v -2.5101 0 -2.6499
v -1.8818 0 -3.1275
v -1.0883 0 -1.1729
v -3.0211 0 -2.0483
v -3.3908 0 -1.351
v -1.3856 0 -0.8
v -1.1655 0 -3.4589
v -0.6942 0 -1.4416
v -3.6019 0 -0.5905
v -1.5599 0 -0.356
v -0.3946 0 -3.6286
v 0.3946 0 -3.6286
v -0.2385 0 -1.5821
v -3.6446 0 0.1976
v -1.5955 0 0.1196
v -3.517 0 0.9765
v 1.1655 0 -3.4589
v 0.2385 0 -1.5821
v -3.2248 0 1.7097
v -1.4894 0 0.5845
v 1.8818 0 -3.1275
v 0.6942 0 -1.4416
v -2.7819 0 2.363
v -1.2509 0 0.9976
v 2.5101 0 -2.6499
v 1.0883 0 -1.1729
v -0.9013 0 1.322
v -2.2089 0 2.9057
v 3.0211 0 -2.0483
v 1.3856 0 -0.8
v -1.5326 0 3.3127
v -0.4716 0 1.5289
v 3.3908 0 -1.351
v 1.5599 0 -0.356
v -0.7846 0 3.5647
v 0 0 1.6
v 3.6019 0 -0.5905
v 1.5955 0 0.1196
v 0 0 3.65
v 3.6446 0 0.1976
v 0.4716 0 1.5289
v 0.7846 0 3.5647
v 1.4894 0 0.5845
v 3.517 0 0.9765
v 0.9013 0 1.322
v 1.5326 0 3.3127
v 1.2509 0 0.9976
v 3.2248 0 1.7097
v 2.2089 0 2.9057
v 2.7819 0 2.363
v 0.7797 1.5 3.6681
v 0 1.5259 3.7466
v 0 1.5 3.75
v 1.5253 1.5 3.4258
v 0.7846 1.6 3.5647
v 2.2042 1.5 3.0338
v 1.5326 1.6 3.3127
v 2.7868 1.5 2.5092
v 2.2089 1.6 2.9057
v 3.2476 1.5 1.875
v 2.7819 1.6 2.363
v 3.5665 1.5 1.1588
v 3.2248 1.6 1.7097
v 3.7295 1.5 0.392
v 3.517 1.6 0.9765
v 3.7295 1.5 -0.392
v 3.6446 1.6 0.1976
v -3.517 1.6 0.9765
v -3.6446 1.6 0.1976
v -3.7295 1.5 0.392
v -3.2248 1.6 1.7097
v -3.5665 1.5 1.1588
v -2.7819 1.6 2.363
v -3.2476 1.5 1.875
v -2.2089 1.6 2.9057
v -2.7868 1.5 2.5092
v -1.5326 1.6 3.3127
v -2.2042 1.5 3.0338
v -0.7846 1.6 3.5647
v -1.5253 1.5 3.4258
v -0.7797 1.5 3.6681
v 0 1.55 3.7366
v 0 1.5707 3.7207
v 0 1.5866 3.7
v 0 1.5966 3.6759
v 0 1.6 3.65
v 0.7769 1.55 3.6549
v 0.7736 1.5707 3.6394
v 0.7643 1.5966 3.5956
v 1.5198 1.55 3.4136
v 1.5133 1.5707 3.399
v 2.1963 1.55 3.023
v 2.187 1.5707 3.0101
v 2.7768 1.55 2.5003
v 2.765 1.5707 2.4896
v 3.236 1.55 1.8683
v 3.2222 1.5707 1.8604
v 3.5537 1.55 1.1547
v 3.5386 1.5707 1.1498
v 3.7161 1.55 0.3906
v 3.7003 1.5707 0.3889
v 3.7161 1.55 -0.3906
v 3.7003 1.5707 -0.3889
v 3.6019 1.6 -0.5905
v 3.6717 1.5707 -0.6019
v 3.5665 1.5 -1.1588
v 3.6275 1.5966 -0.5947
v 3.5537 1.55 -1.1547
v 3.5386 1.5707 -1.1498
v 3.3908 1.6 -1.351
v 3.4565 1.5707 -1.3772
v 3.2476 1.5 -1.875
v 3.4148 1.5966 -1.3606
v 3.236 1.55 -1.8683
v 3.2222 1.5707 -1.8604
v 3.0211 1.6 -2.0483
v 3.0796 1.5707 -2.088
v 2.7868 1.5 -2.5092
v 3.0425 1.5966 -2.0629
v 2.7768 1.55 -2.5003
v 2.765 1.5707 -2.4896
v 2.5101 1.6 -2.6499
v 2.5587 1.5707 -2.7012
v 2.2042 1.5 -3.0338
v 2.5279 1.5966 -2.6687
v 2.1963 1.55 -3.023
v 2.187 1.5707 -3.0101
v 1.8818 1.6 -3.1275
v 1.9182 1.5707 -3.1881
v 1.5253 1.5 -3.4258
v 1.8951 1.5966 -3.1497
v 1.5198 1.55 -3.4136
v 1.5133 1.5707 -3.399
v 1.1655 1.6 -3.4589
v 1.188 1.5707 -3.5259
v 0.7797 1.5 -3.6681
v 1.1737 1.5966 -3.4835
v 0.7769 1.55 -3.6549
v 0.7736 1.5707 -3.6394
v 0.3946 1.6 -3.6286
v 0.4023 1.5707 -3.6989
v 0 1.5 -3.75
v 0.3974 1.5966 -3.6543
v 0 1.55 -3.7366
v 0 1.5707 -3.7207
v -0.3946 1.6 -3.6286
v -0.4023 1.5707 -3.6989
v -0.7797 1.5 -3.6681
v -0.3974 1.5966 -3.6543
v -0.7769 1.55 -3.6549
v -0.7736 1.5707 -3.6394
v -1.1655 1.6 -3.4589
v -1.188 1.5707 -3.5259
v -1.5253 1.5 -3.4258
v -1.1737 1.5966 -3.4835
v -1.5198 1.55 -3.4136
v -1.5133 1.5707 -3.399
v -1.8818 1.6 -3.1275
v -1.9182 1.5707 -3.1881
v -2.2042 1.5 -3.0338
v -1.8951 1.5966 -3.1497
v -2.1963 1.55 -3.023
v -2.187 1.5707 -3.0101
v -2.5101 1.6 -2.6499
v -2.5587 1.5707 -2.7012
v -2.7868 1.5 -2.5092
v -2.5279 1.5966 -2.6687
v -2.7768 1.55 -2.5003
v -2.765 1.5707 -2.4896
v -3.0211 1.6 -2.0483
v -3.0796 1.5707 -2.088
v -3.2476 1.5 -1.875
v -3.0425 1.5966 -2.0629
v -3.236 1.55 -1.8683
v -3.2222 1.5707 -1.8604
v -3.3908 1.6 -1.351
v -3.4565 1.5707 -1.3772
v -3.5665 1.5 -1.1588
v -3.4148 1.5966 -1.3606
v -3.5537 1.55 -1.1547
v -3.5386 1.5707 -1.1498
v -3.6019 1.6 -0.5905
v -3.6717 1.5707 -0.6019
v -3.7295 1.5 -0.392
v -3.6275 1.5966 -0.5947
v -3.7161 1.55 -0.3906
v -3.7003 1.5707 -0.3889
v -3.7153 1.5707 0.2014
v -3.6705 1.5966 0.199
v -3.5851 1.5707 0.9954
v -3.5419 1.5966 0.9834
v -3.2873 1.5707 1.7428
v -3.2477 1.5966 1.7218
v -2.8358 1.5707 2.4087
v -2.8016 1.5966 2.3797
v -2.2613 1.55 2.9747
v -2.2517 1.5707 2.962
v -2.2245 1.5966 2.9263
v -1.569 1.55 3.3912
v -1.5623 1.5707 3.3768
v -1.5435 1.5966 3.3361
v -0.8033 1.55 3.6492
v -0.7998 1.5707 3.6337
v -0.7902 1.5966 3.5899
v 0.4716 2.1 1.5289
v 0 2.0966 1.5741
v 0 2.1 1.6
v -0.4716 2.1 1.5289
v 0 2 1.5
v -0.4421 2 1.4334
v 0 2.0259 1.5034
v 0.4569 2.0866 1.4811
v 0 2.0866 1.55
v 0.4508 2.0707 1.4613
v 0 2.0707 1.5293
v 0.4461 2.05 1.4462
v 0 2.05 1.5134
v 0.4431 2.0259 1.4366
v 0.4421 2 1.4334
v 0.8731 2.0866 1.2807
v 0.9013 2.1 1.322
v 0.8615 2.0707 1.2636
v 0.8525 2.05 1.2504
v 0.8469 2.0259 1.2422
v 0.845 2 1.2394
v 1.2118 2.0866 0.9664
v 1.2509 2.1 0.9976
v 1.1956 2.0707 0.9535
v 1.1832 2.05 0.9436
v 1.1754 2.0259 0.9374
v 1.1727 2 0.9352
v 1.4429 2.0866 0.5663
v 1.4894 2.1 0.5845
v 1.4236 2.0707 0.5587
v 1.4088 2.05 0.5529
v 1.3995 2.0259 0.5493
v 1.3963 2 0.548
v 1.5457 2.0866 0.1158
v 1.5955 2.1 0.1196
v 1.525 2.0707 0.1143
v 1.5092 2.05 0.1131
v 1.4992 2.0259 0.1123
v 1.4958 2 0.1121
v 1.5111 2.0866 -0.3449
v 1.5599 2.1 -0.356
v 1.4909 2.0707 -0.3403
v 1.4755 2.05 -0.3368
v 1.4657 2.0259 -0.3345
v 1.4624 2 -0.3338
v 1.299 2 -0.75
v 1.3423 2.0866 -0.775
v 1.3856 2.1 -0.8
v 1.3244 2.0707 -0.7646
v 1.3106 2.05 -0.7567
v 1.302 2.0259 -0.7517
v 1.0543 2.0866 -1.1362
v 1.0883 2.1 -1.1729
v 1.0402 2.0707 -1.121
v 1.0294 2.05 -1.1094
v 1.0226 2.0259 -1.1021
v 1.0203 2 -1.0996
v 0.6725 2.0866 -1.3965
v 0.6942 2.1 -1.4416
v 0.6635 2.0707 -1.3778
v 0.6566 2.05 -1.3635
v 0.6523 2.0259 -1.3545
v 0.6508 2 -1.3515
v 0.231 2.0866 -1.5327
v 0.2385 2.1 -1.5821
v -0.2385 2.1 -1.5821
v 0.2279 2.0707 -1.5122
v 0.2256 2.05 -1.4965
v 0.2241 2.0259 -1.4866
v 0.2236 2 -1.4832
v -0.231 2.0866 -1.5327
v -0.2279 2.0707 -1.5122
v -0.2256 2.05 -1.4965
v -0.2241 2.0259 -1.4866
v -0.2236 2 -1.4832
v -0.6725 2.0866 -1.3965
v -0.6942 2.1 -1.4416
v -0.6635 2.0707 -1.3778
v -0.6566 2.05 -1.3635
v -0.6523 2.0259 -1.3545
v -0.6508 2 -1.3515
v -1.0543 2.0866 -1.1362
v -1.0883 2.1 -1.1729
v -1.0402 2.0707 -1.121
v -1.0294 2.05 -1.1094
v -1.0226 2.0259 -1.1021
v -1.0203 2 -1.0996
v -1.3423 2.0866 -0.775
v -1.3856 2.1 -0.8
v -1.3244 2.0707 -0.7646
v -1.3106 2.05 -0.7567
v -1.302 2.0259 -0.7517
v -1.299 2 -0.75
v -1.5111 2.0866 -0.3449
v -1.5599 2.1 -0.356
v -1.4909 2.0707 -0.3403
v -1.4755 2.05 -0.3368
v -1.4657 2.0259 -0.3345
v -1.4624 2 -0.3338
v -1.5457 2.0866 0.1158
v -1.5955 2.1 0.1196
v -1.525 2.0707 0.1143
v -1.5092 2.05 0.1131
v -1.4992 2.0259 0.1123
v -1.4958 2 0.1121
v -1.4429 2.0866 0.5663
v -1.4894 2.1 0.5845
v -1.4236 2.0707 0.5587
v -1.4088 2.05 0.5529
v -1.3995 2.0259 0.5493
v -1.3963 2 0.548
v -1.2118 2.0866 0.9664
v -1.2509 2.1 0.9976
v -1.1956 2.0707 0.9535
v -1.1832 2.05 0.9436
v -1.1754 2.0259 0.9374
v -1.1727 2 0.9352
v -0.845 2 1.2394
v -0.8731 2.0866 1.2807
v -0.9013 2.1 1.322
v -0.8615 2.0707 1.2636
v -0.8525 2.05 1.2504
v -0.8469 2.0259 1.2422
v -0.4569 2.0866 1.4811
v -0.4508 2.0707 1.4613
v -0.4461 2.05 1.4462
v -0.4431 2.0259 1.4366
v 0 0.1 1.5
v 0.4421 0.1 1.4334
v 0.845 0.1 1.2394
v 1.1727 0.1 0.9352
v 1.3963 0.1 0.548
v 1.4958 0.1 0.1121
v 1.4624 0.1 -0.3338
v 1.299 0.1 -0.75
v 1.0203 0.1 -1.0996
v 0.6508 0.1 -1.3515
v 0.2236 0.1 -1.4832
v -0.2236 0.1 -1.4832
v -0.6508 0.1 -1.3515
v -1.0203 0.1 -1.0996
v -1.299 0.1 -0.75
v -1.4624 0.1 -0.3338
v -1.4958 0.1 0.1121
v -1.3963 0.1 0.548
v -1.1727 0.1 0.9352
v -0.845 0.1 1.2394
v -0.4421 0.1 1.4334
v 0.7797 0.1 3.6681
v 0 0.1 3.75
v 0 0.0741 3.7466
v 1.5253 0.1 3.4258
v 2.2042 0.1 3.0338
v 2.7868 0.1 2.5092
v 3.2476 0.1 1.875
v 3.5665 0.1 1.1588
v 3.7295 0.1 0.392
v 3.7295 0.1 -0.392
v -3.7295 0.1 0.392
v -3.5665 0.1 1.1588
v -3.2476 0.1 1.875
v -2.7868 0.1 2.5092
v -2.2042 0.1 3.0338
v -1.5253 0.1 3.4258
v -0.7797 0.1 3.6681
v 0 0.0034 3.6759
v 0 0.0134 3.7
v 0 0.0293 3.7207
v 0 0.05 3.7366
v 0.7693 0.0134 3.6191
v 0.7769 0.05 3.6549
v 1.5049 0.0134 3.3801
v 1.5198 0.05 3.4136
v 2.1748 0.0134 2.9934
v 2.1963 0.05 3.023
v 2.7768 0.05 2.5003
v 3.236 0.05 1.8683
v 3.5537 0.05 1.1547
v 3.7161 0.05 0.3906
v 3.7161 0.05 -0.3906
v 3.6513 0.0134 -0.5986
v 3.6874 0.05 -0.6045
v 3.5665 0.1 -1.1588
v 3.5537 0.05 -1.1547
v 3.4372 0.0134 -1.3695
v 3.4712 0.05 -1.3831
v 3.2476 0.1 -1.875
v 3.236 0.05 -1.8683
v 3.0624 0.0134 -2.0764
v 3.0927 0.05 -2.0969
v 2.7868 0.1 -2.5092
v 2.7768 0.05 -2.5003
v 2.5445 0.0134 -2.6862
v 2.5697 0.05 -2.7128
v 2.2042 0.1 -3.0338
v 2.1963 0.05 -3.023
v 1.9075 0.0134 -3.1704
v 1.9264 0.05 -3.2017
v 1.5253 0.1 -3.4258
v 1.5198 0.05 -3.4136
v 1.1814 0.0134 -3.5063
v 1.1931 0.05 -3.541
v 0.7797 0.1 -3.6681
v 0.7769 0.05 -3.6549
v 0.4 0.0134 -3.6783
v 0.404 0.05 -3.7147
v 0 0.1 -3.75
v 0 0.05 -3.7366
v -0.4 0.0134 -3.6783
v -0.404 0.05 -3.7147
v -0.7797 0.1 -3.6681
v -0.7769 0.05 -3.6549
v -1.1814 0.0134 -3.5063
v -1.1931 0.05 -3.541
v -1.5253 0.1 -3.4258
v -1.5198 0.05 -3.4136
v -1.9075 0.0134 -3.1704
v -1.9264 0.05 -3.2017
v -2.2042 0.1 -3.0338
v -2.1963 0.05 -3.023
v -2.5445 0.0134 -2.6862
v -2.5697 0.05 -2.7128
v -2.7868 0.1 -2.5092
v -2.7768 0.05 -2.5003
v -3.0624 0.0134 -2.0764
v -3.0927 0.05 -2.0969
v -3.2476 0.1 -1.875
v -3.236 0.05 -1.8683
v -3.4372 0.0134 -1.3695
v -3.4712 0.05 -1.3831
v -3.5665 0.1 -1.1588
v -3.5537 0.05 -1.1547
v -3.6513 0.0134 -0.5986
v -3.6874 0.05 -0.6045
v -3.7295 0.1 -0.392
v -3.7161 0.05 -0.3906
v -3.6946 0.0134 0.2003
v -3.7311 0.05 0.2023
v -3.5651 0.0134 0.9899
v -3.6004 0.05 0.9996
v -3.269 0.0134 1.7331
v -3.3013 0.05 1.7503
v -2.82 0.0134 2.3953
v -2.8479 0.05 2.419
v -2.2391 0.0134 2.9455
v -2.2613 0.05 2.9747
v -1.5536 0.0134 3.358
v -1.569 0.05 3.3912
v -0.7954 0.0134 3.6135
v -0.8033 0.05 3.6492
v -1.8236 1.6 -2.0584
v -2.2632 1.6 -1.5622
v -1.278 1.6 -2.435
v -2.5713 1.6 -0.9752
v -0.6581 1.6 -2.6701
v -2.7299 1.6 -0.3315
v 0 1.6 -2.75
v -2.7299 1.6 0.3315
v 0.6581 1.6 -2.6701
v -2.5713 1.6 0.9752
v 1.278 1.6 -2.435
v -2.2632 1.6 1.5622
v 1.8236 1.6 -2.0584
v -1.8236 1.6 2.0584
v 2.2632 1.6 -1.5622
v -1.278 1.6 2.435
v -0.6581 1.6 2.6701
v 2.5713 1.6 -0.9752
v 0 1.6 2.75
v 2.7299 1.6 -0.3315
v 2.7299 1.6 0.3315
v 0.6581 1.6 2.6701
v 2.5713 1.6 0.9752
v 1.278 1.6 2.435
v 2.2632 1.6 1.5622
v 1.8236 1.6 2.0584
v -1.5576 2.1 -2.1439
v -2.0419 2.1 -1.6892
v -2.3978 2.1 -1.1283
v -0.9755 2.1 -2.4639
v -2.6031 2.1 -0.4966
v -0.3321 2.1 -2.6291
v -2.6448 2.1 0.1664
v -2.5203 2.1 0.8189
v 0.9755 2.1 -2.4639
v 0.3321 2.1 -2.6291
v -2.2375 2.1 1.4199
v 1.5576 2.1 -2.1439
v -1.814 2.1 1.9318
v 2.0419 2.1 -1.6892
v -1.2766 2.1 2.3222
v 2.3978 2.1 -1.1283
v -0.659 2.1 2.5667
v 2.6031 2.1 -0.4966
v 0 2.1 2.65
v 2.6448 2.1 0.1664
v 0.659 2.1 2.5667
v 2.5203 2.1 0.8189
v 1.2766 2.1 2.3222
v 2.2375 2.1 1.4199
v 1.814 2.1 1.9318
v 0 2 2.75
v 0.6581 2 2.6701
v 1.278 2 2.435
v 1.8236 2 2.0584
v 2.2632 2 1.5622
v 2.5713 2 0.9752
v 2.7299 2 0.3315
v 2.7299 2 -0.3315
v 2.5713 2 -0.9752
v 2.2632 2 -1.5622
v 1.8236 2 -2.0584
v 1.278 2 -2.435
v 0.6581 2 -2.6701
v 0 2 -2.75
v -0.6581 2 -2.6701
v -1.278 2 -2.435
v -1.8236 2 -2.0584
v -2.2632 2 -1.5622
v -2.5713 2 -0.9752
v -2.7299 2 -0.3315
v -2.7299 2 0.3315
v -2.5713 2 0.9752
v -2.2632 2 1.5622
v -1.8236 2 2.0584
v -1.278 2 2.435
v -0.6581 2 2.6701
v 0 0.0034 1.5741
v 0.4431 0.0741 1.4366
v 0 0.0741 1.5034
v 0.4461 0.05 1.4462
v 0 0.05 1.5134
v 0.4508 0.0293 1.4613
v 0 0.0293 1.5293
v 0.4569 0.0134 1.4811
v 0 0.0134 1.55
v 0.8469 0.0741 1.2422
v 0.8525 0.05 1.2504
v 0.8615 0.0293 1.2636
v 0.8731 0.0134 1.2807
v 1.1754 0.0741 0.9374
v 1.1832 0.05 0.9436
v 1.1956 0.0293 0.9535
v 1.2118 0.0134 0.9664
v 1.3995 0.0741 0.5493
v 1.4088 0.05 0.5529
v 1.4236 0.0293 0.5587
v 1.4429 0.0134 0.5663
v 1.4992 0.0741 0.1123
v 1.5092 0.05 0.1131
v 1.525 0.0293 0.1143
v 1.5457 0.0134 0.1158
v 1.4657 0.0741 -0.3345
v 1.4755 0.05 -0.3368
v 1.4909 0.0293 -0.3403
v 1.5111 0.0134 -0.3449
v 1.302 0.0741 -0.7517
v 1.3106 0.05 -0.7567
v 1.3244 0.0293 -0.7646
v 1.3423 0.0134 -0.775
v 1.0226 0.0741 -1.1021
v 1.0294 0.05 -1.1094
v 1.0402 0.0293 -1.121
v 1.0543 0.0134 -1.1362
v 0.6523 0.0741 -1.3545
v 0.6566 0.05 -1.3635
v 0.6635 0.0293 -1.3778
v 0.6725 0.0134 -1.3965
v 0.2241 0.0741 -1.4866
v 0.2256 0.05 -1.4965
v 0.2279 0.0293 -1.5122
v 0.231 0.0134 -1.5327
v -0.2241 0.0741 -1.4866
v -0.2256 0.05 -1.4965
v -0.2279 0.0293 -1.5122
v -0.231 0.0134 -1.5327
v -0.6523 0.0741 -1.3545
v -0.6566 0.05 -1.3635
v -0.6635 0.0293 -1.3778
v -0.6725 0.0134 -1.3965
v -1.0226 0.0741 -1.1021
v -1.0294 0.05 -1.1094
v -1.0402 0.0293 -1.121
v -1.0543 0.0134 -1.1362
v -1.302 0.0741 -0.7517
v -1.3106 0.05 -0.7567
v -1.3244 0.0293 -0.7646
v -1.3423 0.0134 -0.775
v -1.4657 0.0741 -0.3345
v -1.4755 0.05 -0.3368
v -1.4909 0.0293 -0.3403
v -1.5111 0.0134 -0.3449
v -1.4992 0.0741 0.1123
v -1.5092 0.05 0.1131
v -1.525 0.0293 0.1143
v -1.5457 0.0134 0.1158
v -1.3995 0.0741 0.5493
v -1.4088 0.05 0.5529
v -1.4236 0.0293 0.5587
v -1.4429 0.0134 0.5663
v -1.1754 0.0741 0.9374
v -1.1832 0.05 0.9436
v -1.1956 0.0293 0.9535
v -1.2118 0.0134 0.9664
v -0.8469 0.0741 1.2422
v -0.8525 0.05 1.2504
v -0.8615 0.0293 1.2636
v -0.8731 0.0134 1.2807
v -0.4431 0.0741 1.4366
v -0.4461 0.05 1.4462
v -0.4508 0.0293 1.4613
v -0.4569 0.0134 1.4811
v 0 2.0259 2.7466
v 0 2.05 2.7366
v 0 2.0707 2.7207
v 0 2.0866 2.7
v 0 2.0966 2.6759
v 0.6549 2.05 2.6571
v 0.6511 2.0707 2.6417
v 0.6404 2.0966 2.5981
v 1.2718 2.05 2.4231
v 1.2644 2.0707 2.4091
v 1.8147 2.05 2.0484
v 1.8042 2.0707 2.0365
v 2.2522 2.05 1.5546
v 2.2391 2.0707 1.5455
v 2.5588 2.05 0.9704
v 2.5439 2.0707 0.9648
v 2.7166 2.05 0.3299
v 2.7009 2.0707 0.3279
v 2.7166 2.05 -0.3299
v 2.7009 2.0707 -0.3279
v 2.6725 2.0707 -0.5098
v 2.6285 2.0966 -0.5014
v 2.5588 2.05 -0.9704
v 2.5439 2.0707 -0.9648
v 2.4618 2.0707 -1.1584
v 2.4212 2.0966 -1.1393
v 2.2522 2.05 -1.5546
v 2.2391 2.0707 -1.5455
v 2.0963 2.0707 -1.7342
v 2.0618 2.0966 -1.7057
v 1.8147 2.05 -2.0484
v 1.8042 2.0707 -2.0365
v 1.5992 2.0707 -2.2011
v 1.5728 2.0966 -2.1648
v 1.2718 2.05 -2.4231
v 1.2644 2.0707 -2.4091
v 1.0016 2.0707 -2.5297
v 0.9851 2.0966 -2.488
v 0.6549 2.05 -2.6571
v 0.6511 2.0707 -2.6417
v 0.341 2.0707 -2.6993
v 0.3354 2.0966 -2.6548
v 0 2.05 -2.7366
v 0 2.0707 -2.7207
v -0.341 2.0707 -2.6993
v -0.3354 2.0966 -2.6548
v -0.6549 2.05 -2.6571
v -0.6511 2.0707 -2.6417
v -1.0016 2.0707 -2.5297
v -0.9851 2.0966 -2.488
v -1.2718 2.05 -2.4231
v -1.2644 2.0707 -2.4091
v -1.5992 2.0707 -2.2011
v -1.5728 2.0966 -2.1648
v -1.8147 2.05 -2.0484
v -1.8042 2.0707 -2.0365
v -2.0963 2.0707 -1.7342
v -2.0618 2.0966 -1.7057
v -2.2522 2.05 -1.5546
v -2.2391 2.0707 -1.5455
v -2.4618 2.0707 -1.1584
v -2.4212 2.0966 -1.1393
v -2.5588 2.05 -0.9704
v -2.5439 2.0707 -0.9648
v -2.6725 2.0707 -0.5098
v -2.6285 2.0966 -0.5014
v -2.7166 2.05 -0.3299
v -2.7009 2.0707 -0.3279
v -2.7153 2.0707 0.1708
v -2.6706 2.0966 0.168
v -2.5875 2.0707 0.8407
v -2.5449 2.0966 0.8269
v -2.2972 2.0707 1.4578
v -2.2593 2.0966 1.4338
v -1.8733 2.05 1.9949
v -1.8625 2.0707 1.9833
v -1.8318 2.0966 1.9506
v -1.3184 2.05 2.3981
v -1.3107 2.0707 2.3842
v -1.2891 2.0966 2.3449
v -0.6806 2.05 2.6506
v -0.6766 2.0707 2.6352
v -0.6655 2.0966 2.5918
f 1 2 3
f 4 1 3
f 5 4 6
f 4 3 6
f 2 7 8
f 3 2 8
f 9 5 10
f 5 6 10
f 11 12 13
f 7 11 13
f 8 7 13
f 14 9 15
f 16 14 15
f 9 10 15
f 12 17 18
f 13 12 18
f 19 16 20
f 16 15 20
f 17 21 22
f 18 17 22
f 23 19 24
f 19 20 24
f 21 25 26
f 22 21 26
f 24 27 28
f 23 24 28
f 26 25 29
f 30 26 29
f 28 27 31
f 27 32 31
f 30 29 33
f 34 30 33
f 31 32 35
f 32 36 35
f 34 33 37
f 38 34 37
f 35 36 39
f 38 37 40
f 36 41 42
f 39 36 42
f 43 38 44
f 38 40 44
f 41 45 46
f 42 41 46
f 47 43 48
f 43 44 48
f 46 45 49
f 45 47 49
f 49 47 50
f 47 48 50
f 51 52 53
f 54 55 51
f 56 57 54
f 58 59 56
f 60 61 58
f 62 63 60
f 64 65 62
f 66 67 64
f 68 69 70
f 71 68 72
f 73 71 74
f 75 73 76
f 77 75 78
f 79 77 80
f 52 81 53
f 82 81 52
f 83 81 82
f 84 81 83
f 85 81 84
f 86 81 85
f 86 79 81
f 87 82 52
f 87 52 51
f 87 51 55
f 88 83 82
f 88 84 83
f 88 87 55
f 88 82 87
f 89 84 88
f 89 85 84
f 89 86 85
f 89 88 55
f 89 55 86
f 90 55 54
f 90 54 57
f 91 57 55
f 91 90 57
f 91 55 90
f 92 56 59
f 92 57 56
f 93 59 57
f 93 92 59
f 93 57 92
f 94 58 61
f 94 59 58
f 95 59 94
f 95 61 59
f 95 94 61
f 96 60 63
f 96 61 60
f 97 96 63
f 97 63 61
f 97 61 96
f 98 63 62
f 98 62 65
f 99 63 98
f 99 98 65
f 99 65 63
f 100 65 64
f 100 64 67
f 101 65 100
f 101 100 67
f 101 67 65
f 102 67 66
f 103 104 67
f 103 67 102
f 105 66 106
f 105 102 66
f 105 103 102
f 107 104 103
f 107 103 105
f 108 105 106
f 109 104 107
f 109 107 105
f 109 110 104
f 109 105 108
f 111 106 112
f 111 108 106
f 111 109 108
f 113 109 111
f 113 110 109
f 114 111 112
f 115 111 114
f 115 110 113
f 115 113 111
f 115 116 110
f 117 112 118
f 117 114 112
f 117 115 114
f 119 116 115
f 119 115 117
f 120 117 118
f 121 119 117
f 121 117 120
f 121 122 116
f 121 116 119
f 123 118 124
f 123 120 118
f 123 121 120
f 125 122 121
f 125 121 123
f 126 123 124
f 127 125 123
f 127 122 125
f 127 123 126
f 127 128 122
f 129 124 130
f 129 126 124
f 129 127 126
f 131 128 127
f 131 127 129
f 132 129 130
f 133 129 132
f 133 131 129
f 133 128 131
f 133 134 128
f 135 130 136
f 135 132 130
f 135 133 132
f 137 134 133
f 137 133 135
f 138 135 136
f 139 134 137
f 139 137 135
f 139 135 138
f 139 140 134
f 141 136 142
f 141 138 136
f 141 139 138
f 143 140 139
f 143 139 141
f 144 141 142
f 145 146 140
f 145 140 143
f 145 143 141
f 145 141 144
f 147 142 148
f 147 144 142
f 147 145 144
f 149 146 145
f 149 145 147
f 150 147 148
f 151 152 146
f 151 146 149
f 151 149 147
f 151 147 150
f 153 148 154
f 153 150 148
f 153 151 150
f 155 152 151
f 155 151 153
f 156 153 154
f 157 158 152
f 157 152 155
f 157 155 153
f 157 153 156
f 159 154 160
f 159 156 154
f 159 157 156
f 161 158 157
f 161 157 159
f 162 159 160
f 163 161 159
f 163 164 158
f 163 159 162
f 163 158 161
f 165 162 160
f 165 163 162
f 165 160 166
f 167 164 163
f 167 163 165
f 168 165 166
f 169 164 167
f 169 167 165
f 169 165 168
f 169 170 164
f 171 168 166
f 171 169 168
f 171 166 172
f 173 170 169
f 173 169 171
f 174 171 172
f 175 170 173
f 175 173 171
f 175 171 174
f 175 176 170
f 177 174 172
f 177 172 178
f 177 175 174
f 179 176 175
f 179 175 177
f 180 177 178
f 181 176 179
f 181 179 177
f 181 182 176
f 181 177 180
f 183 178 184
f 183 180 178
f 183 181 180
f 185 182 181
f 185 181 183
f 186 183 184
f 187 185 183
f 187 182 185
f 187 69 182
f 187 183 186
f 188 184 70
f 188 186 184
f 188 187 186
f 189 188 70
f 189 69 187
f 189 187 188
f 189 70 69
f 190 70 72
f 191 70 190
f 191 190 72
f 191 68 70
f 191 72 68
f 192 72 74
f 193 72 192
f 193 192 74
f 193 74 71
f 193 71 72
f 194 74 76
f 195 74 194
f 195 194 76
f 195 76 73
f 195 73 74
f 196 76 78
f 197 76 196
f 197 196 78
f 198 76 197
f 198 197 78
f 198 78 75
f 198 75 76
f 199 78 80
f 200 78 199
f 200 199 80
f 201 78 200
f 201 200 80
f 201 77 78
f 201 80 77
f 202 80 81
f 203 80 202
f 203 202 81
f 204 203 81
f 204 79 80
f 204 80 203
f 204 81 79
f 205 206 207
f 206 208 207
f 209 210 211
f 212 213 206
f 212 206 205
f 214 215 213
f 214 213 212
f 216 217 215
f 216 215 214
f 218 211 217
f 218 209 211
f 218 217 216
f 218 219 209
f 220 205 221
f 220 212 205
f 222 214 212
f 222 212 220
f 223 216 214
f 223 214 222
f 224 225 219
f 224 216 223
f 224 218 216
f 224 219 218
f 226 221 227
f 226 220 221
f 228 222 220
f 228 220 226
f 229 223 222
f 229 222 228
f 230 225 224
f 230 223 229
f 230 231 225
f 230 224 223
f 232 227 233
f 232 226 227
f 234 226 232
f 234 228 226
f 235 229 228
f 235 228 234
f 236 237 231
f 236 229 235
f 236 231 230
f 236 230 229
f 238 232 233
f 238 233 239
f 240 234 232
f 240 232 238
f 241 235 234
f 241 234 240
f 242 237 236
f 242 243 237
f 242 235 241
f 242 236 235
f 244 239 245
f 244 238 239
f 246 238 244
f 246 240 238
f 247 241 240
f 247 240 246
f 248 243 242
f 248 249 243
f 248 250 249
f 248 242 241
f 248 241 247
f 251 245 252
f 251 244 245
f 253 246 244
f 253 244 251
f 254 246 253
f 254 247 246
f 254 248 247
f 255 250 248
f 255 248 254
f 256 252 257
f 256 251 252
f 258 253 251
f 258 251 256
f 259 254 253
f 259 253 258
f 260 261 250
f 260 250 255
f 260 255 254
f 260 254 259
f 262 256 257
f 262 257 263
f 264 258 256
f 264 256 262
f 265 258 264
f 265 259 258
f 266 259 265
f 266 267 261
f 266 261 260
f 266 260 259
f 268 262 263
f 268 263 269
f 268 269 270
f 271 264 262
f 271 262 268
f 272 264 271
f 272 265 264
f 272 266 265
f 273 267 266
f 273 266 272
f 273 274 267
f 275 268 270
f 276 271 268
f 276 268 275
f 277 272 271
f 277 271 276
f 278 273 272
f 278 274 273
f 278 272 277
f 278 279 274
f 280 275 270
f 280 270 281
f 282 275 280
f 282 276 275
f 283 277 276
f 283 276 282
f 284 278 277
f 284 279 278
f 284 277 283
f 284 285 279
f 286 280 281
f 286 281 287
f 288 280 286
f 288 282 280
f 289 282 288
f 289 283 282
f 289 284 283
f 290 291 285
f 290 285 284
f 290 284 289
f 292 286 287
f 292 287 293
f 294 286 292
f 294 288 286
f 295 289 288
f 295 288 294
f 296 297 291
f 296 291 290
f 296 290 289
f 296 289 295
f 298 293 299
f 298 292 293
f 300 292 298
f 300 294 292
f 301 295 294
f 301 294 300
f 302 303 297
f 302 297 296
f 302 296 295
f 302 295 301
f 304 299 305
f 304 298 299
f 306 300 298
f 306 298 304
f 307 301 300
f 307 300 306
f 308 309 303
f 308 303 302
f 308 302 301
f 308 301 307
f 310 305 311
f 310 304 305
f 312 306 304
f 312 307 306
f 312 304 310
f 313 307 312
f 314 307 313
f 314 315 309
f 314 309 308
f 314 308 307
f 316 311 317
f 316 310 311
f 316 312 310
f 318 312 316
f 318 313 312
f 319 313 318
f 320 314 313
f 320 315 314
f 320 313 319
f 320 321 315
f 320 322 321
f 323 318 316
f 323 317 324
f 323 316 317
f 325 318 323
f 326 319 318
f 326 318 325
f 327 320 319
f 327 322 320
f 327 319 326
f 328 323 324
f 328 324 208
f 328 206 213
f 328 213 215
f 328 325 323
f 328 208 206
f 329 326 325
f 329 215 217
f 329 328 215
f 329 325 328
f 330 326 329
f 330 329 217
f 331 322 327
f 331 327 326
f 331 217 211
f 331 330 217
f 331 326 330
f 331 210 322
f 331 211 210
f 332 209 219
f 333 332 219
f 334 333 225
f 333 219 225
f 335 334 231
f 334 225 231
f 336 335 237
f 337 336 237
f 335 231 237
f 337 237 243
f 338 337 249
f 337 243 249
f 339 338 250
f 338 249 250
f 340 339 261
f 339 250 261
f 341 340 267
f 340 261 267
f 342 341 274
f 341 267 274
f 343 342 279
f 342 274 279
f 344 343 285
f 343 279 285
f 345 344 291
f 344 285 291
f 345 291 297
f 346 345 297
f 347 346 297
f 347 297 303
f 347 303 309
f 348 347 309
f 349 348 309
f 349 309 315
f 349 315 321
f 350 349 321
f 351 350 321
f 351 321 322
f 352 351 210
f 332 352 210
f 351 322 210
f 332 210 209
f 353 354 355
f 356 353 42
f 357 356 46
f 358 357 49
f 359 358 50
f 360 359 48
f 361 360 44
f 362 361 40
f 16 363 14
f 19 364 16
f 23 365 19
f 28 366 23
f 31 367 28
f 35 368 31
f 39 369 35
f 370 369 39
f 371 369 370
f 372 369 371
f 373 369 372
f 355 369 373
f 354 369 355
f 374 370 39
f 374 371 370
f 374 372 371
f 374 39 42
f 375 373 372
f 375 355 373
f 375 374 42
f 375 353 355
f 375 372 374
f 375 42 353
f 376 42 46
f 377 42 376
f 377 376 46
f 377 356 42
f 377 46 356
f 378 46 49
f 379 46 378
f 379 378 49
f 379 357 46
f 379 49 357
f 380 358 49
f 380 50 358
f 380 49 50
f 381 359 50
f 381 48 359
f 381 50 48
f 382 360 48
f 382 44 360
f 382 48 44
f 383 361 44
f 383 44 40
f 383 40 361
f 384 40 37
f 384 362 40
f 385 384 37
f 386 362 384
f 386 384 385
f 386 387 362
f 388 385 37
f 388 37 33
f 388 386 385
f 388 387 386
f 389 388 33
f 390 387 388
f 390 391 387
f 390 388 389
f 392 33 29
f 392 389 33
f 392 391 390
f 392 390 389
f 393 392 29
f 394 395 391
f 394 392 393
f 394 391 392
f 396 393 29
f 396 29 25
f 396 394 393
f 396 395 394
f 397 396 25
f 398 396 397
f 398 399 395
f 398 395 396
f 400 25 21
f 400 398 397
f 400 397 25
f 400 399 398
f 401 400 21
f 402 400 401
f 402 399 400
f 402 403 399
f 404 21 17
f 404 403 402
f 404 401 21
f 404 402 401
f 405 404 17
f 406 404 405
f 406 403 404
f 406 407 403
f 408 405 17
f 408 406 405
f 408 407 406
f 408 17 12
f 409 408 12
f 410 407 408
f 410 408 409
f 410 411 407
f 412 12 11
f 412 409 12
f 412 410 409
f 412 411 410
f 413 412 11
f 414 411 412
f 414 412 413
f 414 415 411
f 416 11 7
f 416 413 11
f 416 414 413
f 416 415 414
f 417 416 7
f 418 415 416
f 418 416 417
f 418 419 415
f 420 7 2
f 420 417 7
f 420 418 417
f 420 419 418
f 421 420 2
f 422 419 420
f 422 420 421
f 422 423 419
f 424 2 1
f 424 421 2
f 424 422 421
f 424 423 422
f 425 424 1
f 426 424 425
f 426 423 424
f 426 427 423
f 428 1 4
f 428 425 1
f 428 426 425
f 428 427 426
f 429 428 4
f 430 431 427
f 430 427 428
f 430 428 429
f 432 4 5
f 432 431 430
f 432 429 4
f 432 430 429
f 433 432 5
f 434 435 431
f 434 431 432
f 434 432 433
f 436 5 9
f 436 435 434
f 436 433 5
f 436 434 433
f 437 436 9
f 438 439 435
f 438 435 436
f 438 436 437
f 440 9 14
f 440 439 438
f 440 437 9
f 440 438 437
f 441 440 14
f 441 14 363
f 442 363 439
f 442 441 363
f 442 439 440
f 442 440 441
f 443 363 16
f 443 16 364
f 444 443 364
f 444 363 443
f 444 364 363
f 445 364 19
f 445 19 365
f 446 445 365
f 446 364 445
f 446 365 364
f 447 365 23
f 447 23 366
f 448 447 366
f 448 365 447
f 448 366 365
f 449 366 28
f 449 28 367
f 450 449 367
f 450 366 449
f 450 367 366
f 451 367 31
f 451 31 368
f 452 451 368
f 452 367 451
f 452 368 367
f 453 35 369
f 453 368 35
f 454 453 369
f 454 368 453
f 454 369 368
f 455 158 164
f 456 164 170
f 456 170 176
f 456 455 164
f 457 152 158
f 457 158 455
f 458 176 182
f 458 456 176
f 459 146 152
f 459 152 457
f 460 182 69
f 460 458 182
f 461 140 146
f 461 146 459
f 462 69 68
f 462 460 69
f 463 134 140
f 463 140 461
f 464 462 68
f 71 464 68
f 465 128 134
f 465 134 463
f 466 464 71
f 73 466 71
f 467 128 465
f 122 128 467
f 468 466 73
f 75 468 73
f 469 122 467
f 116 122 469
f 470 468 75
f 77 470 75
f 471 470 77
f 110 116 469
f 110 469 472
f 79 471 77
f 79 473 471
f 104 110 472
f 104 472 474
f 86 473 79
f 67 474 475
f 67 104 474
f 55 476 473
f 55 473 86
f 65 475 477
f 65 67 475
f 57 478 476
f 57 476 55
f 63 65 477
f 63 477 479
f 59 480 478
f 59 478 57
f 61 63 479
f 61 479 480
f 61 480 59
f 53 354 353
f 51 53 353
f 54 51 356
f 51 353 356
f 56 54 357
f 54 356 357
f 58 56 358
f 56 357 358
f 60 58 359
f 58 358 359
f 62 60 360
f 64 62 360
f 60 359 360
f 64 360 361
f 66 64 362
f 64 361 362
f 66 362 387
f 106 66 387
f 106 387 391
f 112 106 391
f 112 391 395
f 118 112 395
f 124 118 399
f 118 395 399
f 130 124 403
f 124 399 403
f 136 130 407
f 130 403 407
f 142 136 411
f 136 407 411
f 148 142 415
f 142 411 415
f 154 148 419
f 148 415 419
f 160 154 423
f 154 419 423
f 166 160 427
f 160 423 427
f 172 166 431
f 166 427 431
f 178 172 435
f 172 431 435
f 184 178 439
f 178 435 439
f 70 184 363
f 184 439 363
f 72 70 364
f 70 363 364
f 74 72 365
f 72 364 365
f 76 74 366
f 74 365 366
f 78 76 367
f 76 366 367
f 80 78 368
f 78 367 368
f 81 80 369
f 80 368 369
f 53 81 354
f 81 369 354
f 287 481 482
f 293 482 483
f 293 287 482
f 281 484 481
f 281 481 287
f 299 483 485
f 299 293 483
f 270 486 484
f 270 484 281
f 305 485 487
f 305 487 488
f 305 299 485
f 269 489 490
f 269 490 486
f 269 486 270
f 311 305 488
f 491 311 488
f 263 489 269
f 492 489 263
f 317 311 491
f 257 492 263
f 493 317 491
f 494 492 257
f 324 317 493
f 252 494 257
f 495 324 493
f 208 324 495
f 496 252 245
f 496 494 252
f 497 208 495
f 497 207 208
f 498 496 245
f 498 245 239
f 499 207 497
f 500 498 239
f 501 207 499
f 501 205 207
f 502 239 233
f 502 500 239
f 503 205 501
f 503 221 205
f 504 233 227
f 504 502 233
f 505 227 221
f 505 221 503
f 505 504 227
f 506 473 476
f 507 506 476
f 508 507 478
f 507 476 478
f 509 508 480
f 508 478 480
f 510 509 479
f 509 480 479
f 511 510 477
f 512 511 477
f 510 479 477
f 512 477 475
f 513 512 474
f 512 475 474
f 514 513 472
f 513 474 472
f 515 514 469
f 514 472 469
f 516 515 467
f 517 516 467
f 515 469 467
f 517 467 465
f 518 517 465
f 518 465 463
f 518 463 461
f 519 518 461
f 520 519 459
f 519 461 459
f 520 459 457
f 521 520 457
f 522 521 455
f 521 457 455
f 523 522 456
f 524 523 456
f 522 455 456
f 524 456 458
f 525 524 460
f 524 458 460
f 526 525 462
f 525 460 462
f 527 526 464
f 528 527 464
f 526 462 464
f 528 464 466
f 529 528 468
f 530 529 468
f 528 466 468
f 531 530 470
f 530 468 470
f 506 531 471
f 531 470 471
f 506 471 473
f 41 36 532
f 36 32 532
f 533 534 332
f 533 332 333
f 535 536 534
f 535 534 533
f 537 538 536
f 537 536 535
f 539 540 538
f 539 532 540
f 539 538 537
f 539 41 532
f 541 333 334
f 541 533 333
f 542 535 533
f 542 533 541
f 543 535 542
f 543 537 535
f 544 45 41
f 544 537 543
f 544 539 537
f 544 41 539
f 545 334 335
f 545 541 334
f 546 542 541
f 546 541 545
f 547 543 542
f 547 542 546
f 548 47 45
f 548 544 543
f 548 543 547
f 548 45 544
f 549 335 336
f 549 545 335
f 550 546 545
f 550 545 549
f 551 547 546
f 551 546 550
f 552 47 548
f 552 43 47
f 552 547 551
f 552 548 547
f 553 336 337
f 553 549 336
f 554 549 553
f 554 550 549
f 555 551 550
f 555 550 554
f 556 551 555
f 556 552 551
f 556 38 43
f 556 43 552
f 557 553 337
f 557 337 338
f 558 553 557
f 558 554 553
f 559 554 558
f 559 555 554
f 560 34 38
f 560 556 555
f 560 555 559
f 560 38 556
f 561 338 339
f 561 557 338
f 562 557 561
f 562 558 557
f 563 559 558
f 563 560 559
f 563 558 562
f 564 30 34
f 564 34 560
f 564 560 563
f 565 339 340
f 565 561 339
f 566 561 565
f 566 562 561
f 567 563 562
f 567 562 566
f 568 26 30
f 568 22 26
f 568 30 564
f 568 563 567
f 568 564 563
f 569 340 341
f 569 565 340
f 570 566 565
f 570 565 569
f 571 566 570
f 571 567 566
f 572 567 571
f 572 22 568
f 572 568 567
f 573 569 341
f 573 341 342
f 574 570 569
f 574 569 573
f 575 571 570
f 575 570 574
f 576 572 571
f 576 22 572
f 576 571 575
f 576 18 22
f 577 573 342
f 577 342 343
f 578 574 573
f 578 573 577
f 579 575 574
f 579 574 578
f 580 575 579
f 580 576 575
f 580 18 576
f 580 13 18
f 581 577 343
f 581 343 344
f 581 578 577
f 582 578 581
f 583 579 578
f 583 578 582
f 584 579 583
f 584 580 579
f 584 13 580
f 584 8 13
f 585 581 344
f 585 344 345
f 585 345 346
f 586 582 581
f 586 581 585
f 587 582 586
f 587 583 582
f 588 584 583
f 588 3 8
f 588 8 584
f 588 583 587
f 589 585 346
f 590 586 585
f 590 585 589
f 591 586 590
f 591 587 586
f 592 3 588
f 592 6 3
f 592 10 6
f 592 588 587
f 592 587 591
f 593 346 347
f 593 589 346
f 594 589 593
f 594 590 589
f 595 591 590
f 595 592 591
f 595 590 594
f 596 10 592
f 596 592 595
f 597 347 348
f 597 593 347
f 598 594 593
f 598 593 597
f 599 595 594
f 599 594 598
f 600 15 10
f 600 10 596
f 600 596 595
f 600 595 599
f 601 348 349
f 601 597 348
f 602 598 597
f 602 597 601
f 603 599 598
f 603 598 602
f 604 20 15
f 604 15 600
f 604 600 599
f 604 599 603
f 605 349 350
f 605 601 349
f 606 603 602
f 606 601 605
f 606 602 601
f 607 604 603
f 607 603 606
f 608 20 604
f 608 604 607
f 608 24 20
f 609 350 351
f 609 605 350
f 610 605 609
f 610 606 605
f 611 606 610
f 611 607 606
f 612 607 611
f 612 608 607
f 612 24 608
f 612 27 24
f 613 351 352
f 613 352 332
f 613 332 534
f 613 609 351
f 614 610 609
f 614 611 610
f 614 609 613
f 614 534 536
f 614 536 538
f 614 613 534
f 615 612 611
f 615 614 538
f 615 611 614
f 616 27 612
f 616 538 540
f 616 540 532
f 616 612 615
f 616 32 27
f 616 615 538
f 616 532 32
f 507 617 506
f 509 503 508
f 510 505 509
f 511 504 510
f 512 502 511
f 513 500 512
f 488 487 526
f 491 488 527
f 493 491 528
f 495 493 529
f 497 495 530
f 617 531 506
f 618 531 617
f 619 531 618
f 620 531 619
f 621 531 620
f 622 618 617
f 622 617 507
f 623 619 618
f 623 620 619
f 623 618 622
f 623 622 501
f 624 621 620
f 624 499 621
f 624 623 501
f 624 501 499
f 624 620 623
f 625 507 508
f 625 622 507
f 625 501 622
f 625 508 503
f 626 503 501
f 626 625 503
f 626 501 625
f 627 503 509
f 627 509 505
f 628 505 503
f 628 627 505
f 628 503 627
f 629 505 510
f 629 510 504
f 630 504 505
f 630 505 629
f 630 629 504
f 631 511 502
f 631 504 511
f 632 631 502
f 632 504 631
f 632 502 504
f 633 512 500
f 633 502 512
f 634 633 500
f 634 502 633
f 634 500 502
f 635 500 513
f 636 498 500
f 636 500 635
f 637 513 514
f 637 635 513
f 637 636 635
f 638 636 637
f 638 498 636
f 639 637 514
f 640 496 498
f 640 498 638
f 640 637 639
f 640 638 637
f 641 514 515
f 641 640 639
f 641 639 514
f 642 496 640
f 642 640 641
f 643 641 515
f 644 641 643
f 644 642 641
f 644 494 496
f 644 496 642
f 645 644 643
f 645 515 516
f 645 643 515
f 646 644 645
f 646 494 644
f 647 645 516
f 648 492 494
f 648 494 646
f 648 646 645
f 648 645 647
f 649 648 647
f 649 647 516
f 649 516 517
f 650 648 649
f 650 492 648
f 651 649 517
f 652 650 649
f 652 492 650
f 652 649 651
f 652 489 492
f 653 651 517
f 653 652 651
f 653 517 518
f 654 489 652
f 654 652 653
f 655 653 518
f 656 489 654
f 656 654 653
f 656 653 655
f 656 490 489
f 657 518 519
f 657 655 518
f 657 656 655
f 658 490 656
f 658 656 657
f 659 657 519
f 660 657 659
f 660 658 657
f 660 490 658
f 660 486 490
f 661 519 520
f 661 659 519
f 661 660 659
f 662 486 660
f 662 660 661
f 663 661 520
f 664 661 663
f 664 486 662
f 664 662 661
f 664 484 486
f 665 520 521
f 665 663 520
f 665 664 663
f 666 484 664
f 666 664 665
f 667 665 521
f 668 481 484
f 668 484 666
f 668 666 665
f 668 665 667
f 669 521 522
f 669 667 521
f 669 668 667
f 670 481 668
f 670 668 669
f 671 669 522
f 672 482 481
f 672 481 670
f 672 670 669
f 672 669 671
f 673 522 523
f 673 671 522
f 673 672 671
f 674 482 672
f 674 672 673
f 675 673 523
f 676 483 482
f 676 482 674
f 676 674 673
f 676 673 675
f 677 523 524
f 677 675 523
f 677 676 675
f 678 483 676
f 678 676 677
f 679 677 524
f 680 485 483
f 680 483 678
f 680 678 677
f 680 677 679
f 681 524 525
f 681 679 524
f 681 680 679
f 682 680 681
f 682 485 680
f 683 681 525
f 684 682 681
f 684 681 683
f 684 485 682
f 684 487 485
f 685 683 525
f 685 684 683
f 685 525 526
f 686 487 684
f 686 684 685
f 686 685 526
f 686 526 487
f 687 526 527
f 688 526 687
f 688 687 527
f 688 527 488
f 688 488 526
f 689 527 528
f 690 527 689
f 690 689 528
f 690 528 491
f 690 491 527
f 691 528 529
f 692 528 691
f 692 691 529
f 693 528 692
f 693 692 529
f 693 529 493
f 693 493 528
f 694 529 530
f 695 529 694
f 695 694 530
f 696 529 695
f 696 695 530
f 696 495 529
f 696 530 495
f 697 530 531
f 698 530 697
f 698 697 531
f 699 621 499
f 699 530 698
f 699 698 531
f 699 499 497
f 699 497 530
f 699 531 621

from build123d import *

# Parameters (mm, degrees)
SKETCH_1_R          = 3.75
EXTRUDE_2_DEPTH     = 1.6
SKETCH_2_R          = 1.5
CUT_EXTRUDE_1_DEPTH = 2
SKETCH_3_R          = 2.75
EXTRUDE_3_DEPTH     = 0.5
SKETCH_4_R          = 1.5
CUT_EXTRUDE_2_DEPTH = 3
FILLET_1_R          = 0.1


with BuildPart() as part:
    # 草图1 → 凸台-拉伸2 (new body)
    with BuildSketch(Plane(origin=(0, 0, 0), x_dir=(1, 0, 0), z_dir=(0, 1, 0))):
        with Locations(Location((0, 0, 0), (0, 0, 270))):
            Circle(SKETCH_1_R)
    extrude(amount=EXTRUDE_2_DEPTH)

    # 草图2 → 切除-拉伸1 (cut)
    with BuildSketch(Plane(origin=(0, 1.6, 0), x_dir=(1, 0, 0), z_dir=(0, 1, 0))):
        with Locations(Location((0, 0, 0), (0, 0, 270))):
            Circle(SKETCH_2_R)
    extrude(amount=-CUT_EXTRUDE_1_DEPTH, mode=Mode.SUBTRACT)

    # 草图3 → 凸台-拉伸3 (add)
    with BuildSketch(Plane(origin=(0, 1.6, 0), x_dir=(1, 0, 0), z_dir=(0, 1, 0))):
        with Locations(Location((0, 0, 0), (0, 0, 270))):
            Circle(SKETCH_3_R)
    extrude(amount=EXTRUDE_3_DEPTH)

    # 草图4 → 切除-拉伸2 (cut)
    with BuildSketch(Plane(origin=(0, 2.1, 0), x_dir=(1, 0, 0), z_dir=(0, 1, 0))):
        with Locations(Location((0, 0, 0), (0, 0, 270))):
            Circle(SKETCH_4_R)
    extrude(amount=-CUT_EXTRUDE_2_DEPTH, mode=Mode.SUBTRACT)

    # 圆角1
    fillet_1_edges = [part.edges().sort_by_distance(p)[0] for p in [
        (0, 2.1, -2.75),
        (0, 2.1, -1.5),
        (0, 0, -3.75),
        (0, 1.6, -3.75),
        (0, 0, -1.5),
    ]]
    fillet(fillet_1_edges, radius=FILLET_1_R)


solid = part.part
